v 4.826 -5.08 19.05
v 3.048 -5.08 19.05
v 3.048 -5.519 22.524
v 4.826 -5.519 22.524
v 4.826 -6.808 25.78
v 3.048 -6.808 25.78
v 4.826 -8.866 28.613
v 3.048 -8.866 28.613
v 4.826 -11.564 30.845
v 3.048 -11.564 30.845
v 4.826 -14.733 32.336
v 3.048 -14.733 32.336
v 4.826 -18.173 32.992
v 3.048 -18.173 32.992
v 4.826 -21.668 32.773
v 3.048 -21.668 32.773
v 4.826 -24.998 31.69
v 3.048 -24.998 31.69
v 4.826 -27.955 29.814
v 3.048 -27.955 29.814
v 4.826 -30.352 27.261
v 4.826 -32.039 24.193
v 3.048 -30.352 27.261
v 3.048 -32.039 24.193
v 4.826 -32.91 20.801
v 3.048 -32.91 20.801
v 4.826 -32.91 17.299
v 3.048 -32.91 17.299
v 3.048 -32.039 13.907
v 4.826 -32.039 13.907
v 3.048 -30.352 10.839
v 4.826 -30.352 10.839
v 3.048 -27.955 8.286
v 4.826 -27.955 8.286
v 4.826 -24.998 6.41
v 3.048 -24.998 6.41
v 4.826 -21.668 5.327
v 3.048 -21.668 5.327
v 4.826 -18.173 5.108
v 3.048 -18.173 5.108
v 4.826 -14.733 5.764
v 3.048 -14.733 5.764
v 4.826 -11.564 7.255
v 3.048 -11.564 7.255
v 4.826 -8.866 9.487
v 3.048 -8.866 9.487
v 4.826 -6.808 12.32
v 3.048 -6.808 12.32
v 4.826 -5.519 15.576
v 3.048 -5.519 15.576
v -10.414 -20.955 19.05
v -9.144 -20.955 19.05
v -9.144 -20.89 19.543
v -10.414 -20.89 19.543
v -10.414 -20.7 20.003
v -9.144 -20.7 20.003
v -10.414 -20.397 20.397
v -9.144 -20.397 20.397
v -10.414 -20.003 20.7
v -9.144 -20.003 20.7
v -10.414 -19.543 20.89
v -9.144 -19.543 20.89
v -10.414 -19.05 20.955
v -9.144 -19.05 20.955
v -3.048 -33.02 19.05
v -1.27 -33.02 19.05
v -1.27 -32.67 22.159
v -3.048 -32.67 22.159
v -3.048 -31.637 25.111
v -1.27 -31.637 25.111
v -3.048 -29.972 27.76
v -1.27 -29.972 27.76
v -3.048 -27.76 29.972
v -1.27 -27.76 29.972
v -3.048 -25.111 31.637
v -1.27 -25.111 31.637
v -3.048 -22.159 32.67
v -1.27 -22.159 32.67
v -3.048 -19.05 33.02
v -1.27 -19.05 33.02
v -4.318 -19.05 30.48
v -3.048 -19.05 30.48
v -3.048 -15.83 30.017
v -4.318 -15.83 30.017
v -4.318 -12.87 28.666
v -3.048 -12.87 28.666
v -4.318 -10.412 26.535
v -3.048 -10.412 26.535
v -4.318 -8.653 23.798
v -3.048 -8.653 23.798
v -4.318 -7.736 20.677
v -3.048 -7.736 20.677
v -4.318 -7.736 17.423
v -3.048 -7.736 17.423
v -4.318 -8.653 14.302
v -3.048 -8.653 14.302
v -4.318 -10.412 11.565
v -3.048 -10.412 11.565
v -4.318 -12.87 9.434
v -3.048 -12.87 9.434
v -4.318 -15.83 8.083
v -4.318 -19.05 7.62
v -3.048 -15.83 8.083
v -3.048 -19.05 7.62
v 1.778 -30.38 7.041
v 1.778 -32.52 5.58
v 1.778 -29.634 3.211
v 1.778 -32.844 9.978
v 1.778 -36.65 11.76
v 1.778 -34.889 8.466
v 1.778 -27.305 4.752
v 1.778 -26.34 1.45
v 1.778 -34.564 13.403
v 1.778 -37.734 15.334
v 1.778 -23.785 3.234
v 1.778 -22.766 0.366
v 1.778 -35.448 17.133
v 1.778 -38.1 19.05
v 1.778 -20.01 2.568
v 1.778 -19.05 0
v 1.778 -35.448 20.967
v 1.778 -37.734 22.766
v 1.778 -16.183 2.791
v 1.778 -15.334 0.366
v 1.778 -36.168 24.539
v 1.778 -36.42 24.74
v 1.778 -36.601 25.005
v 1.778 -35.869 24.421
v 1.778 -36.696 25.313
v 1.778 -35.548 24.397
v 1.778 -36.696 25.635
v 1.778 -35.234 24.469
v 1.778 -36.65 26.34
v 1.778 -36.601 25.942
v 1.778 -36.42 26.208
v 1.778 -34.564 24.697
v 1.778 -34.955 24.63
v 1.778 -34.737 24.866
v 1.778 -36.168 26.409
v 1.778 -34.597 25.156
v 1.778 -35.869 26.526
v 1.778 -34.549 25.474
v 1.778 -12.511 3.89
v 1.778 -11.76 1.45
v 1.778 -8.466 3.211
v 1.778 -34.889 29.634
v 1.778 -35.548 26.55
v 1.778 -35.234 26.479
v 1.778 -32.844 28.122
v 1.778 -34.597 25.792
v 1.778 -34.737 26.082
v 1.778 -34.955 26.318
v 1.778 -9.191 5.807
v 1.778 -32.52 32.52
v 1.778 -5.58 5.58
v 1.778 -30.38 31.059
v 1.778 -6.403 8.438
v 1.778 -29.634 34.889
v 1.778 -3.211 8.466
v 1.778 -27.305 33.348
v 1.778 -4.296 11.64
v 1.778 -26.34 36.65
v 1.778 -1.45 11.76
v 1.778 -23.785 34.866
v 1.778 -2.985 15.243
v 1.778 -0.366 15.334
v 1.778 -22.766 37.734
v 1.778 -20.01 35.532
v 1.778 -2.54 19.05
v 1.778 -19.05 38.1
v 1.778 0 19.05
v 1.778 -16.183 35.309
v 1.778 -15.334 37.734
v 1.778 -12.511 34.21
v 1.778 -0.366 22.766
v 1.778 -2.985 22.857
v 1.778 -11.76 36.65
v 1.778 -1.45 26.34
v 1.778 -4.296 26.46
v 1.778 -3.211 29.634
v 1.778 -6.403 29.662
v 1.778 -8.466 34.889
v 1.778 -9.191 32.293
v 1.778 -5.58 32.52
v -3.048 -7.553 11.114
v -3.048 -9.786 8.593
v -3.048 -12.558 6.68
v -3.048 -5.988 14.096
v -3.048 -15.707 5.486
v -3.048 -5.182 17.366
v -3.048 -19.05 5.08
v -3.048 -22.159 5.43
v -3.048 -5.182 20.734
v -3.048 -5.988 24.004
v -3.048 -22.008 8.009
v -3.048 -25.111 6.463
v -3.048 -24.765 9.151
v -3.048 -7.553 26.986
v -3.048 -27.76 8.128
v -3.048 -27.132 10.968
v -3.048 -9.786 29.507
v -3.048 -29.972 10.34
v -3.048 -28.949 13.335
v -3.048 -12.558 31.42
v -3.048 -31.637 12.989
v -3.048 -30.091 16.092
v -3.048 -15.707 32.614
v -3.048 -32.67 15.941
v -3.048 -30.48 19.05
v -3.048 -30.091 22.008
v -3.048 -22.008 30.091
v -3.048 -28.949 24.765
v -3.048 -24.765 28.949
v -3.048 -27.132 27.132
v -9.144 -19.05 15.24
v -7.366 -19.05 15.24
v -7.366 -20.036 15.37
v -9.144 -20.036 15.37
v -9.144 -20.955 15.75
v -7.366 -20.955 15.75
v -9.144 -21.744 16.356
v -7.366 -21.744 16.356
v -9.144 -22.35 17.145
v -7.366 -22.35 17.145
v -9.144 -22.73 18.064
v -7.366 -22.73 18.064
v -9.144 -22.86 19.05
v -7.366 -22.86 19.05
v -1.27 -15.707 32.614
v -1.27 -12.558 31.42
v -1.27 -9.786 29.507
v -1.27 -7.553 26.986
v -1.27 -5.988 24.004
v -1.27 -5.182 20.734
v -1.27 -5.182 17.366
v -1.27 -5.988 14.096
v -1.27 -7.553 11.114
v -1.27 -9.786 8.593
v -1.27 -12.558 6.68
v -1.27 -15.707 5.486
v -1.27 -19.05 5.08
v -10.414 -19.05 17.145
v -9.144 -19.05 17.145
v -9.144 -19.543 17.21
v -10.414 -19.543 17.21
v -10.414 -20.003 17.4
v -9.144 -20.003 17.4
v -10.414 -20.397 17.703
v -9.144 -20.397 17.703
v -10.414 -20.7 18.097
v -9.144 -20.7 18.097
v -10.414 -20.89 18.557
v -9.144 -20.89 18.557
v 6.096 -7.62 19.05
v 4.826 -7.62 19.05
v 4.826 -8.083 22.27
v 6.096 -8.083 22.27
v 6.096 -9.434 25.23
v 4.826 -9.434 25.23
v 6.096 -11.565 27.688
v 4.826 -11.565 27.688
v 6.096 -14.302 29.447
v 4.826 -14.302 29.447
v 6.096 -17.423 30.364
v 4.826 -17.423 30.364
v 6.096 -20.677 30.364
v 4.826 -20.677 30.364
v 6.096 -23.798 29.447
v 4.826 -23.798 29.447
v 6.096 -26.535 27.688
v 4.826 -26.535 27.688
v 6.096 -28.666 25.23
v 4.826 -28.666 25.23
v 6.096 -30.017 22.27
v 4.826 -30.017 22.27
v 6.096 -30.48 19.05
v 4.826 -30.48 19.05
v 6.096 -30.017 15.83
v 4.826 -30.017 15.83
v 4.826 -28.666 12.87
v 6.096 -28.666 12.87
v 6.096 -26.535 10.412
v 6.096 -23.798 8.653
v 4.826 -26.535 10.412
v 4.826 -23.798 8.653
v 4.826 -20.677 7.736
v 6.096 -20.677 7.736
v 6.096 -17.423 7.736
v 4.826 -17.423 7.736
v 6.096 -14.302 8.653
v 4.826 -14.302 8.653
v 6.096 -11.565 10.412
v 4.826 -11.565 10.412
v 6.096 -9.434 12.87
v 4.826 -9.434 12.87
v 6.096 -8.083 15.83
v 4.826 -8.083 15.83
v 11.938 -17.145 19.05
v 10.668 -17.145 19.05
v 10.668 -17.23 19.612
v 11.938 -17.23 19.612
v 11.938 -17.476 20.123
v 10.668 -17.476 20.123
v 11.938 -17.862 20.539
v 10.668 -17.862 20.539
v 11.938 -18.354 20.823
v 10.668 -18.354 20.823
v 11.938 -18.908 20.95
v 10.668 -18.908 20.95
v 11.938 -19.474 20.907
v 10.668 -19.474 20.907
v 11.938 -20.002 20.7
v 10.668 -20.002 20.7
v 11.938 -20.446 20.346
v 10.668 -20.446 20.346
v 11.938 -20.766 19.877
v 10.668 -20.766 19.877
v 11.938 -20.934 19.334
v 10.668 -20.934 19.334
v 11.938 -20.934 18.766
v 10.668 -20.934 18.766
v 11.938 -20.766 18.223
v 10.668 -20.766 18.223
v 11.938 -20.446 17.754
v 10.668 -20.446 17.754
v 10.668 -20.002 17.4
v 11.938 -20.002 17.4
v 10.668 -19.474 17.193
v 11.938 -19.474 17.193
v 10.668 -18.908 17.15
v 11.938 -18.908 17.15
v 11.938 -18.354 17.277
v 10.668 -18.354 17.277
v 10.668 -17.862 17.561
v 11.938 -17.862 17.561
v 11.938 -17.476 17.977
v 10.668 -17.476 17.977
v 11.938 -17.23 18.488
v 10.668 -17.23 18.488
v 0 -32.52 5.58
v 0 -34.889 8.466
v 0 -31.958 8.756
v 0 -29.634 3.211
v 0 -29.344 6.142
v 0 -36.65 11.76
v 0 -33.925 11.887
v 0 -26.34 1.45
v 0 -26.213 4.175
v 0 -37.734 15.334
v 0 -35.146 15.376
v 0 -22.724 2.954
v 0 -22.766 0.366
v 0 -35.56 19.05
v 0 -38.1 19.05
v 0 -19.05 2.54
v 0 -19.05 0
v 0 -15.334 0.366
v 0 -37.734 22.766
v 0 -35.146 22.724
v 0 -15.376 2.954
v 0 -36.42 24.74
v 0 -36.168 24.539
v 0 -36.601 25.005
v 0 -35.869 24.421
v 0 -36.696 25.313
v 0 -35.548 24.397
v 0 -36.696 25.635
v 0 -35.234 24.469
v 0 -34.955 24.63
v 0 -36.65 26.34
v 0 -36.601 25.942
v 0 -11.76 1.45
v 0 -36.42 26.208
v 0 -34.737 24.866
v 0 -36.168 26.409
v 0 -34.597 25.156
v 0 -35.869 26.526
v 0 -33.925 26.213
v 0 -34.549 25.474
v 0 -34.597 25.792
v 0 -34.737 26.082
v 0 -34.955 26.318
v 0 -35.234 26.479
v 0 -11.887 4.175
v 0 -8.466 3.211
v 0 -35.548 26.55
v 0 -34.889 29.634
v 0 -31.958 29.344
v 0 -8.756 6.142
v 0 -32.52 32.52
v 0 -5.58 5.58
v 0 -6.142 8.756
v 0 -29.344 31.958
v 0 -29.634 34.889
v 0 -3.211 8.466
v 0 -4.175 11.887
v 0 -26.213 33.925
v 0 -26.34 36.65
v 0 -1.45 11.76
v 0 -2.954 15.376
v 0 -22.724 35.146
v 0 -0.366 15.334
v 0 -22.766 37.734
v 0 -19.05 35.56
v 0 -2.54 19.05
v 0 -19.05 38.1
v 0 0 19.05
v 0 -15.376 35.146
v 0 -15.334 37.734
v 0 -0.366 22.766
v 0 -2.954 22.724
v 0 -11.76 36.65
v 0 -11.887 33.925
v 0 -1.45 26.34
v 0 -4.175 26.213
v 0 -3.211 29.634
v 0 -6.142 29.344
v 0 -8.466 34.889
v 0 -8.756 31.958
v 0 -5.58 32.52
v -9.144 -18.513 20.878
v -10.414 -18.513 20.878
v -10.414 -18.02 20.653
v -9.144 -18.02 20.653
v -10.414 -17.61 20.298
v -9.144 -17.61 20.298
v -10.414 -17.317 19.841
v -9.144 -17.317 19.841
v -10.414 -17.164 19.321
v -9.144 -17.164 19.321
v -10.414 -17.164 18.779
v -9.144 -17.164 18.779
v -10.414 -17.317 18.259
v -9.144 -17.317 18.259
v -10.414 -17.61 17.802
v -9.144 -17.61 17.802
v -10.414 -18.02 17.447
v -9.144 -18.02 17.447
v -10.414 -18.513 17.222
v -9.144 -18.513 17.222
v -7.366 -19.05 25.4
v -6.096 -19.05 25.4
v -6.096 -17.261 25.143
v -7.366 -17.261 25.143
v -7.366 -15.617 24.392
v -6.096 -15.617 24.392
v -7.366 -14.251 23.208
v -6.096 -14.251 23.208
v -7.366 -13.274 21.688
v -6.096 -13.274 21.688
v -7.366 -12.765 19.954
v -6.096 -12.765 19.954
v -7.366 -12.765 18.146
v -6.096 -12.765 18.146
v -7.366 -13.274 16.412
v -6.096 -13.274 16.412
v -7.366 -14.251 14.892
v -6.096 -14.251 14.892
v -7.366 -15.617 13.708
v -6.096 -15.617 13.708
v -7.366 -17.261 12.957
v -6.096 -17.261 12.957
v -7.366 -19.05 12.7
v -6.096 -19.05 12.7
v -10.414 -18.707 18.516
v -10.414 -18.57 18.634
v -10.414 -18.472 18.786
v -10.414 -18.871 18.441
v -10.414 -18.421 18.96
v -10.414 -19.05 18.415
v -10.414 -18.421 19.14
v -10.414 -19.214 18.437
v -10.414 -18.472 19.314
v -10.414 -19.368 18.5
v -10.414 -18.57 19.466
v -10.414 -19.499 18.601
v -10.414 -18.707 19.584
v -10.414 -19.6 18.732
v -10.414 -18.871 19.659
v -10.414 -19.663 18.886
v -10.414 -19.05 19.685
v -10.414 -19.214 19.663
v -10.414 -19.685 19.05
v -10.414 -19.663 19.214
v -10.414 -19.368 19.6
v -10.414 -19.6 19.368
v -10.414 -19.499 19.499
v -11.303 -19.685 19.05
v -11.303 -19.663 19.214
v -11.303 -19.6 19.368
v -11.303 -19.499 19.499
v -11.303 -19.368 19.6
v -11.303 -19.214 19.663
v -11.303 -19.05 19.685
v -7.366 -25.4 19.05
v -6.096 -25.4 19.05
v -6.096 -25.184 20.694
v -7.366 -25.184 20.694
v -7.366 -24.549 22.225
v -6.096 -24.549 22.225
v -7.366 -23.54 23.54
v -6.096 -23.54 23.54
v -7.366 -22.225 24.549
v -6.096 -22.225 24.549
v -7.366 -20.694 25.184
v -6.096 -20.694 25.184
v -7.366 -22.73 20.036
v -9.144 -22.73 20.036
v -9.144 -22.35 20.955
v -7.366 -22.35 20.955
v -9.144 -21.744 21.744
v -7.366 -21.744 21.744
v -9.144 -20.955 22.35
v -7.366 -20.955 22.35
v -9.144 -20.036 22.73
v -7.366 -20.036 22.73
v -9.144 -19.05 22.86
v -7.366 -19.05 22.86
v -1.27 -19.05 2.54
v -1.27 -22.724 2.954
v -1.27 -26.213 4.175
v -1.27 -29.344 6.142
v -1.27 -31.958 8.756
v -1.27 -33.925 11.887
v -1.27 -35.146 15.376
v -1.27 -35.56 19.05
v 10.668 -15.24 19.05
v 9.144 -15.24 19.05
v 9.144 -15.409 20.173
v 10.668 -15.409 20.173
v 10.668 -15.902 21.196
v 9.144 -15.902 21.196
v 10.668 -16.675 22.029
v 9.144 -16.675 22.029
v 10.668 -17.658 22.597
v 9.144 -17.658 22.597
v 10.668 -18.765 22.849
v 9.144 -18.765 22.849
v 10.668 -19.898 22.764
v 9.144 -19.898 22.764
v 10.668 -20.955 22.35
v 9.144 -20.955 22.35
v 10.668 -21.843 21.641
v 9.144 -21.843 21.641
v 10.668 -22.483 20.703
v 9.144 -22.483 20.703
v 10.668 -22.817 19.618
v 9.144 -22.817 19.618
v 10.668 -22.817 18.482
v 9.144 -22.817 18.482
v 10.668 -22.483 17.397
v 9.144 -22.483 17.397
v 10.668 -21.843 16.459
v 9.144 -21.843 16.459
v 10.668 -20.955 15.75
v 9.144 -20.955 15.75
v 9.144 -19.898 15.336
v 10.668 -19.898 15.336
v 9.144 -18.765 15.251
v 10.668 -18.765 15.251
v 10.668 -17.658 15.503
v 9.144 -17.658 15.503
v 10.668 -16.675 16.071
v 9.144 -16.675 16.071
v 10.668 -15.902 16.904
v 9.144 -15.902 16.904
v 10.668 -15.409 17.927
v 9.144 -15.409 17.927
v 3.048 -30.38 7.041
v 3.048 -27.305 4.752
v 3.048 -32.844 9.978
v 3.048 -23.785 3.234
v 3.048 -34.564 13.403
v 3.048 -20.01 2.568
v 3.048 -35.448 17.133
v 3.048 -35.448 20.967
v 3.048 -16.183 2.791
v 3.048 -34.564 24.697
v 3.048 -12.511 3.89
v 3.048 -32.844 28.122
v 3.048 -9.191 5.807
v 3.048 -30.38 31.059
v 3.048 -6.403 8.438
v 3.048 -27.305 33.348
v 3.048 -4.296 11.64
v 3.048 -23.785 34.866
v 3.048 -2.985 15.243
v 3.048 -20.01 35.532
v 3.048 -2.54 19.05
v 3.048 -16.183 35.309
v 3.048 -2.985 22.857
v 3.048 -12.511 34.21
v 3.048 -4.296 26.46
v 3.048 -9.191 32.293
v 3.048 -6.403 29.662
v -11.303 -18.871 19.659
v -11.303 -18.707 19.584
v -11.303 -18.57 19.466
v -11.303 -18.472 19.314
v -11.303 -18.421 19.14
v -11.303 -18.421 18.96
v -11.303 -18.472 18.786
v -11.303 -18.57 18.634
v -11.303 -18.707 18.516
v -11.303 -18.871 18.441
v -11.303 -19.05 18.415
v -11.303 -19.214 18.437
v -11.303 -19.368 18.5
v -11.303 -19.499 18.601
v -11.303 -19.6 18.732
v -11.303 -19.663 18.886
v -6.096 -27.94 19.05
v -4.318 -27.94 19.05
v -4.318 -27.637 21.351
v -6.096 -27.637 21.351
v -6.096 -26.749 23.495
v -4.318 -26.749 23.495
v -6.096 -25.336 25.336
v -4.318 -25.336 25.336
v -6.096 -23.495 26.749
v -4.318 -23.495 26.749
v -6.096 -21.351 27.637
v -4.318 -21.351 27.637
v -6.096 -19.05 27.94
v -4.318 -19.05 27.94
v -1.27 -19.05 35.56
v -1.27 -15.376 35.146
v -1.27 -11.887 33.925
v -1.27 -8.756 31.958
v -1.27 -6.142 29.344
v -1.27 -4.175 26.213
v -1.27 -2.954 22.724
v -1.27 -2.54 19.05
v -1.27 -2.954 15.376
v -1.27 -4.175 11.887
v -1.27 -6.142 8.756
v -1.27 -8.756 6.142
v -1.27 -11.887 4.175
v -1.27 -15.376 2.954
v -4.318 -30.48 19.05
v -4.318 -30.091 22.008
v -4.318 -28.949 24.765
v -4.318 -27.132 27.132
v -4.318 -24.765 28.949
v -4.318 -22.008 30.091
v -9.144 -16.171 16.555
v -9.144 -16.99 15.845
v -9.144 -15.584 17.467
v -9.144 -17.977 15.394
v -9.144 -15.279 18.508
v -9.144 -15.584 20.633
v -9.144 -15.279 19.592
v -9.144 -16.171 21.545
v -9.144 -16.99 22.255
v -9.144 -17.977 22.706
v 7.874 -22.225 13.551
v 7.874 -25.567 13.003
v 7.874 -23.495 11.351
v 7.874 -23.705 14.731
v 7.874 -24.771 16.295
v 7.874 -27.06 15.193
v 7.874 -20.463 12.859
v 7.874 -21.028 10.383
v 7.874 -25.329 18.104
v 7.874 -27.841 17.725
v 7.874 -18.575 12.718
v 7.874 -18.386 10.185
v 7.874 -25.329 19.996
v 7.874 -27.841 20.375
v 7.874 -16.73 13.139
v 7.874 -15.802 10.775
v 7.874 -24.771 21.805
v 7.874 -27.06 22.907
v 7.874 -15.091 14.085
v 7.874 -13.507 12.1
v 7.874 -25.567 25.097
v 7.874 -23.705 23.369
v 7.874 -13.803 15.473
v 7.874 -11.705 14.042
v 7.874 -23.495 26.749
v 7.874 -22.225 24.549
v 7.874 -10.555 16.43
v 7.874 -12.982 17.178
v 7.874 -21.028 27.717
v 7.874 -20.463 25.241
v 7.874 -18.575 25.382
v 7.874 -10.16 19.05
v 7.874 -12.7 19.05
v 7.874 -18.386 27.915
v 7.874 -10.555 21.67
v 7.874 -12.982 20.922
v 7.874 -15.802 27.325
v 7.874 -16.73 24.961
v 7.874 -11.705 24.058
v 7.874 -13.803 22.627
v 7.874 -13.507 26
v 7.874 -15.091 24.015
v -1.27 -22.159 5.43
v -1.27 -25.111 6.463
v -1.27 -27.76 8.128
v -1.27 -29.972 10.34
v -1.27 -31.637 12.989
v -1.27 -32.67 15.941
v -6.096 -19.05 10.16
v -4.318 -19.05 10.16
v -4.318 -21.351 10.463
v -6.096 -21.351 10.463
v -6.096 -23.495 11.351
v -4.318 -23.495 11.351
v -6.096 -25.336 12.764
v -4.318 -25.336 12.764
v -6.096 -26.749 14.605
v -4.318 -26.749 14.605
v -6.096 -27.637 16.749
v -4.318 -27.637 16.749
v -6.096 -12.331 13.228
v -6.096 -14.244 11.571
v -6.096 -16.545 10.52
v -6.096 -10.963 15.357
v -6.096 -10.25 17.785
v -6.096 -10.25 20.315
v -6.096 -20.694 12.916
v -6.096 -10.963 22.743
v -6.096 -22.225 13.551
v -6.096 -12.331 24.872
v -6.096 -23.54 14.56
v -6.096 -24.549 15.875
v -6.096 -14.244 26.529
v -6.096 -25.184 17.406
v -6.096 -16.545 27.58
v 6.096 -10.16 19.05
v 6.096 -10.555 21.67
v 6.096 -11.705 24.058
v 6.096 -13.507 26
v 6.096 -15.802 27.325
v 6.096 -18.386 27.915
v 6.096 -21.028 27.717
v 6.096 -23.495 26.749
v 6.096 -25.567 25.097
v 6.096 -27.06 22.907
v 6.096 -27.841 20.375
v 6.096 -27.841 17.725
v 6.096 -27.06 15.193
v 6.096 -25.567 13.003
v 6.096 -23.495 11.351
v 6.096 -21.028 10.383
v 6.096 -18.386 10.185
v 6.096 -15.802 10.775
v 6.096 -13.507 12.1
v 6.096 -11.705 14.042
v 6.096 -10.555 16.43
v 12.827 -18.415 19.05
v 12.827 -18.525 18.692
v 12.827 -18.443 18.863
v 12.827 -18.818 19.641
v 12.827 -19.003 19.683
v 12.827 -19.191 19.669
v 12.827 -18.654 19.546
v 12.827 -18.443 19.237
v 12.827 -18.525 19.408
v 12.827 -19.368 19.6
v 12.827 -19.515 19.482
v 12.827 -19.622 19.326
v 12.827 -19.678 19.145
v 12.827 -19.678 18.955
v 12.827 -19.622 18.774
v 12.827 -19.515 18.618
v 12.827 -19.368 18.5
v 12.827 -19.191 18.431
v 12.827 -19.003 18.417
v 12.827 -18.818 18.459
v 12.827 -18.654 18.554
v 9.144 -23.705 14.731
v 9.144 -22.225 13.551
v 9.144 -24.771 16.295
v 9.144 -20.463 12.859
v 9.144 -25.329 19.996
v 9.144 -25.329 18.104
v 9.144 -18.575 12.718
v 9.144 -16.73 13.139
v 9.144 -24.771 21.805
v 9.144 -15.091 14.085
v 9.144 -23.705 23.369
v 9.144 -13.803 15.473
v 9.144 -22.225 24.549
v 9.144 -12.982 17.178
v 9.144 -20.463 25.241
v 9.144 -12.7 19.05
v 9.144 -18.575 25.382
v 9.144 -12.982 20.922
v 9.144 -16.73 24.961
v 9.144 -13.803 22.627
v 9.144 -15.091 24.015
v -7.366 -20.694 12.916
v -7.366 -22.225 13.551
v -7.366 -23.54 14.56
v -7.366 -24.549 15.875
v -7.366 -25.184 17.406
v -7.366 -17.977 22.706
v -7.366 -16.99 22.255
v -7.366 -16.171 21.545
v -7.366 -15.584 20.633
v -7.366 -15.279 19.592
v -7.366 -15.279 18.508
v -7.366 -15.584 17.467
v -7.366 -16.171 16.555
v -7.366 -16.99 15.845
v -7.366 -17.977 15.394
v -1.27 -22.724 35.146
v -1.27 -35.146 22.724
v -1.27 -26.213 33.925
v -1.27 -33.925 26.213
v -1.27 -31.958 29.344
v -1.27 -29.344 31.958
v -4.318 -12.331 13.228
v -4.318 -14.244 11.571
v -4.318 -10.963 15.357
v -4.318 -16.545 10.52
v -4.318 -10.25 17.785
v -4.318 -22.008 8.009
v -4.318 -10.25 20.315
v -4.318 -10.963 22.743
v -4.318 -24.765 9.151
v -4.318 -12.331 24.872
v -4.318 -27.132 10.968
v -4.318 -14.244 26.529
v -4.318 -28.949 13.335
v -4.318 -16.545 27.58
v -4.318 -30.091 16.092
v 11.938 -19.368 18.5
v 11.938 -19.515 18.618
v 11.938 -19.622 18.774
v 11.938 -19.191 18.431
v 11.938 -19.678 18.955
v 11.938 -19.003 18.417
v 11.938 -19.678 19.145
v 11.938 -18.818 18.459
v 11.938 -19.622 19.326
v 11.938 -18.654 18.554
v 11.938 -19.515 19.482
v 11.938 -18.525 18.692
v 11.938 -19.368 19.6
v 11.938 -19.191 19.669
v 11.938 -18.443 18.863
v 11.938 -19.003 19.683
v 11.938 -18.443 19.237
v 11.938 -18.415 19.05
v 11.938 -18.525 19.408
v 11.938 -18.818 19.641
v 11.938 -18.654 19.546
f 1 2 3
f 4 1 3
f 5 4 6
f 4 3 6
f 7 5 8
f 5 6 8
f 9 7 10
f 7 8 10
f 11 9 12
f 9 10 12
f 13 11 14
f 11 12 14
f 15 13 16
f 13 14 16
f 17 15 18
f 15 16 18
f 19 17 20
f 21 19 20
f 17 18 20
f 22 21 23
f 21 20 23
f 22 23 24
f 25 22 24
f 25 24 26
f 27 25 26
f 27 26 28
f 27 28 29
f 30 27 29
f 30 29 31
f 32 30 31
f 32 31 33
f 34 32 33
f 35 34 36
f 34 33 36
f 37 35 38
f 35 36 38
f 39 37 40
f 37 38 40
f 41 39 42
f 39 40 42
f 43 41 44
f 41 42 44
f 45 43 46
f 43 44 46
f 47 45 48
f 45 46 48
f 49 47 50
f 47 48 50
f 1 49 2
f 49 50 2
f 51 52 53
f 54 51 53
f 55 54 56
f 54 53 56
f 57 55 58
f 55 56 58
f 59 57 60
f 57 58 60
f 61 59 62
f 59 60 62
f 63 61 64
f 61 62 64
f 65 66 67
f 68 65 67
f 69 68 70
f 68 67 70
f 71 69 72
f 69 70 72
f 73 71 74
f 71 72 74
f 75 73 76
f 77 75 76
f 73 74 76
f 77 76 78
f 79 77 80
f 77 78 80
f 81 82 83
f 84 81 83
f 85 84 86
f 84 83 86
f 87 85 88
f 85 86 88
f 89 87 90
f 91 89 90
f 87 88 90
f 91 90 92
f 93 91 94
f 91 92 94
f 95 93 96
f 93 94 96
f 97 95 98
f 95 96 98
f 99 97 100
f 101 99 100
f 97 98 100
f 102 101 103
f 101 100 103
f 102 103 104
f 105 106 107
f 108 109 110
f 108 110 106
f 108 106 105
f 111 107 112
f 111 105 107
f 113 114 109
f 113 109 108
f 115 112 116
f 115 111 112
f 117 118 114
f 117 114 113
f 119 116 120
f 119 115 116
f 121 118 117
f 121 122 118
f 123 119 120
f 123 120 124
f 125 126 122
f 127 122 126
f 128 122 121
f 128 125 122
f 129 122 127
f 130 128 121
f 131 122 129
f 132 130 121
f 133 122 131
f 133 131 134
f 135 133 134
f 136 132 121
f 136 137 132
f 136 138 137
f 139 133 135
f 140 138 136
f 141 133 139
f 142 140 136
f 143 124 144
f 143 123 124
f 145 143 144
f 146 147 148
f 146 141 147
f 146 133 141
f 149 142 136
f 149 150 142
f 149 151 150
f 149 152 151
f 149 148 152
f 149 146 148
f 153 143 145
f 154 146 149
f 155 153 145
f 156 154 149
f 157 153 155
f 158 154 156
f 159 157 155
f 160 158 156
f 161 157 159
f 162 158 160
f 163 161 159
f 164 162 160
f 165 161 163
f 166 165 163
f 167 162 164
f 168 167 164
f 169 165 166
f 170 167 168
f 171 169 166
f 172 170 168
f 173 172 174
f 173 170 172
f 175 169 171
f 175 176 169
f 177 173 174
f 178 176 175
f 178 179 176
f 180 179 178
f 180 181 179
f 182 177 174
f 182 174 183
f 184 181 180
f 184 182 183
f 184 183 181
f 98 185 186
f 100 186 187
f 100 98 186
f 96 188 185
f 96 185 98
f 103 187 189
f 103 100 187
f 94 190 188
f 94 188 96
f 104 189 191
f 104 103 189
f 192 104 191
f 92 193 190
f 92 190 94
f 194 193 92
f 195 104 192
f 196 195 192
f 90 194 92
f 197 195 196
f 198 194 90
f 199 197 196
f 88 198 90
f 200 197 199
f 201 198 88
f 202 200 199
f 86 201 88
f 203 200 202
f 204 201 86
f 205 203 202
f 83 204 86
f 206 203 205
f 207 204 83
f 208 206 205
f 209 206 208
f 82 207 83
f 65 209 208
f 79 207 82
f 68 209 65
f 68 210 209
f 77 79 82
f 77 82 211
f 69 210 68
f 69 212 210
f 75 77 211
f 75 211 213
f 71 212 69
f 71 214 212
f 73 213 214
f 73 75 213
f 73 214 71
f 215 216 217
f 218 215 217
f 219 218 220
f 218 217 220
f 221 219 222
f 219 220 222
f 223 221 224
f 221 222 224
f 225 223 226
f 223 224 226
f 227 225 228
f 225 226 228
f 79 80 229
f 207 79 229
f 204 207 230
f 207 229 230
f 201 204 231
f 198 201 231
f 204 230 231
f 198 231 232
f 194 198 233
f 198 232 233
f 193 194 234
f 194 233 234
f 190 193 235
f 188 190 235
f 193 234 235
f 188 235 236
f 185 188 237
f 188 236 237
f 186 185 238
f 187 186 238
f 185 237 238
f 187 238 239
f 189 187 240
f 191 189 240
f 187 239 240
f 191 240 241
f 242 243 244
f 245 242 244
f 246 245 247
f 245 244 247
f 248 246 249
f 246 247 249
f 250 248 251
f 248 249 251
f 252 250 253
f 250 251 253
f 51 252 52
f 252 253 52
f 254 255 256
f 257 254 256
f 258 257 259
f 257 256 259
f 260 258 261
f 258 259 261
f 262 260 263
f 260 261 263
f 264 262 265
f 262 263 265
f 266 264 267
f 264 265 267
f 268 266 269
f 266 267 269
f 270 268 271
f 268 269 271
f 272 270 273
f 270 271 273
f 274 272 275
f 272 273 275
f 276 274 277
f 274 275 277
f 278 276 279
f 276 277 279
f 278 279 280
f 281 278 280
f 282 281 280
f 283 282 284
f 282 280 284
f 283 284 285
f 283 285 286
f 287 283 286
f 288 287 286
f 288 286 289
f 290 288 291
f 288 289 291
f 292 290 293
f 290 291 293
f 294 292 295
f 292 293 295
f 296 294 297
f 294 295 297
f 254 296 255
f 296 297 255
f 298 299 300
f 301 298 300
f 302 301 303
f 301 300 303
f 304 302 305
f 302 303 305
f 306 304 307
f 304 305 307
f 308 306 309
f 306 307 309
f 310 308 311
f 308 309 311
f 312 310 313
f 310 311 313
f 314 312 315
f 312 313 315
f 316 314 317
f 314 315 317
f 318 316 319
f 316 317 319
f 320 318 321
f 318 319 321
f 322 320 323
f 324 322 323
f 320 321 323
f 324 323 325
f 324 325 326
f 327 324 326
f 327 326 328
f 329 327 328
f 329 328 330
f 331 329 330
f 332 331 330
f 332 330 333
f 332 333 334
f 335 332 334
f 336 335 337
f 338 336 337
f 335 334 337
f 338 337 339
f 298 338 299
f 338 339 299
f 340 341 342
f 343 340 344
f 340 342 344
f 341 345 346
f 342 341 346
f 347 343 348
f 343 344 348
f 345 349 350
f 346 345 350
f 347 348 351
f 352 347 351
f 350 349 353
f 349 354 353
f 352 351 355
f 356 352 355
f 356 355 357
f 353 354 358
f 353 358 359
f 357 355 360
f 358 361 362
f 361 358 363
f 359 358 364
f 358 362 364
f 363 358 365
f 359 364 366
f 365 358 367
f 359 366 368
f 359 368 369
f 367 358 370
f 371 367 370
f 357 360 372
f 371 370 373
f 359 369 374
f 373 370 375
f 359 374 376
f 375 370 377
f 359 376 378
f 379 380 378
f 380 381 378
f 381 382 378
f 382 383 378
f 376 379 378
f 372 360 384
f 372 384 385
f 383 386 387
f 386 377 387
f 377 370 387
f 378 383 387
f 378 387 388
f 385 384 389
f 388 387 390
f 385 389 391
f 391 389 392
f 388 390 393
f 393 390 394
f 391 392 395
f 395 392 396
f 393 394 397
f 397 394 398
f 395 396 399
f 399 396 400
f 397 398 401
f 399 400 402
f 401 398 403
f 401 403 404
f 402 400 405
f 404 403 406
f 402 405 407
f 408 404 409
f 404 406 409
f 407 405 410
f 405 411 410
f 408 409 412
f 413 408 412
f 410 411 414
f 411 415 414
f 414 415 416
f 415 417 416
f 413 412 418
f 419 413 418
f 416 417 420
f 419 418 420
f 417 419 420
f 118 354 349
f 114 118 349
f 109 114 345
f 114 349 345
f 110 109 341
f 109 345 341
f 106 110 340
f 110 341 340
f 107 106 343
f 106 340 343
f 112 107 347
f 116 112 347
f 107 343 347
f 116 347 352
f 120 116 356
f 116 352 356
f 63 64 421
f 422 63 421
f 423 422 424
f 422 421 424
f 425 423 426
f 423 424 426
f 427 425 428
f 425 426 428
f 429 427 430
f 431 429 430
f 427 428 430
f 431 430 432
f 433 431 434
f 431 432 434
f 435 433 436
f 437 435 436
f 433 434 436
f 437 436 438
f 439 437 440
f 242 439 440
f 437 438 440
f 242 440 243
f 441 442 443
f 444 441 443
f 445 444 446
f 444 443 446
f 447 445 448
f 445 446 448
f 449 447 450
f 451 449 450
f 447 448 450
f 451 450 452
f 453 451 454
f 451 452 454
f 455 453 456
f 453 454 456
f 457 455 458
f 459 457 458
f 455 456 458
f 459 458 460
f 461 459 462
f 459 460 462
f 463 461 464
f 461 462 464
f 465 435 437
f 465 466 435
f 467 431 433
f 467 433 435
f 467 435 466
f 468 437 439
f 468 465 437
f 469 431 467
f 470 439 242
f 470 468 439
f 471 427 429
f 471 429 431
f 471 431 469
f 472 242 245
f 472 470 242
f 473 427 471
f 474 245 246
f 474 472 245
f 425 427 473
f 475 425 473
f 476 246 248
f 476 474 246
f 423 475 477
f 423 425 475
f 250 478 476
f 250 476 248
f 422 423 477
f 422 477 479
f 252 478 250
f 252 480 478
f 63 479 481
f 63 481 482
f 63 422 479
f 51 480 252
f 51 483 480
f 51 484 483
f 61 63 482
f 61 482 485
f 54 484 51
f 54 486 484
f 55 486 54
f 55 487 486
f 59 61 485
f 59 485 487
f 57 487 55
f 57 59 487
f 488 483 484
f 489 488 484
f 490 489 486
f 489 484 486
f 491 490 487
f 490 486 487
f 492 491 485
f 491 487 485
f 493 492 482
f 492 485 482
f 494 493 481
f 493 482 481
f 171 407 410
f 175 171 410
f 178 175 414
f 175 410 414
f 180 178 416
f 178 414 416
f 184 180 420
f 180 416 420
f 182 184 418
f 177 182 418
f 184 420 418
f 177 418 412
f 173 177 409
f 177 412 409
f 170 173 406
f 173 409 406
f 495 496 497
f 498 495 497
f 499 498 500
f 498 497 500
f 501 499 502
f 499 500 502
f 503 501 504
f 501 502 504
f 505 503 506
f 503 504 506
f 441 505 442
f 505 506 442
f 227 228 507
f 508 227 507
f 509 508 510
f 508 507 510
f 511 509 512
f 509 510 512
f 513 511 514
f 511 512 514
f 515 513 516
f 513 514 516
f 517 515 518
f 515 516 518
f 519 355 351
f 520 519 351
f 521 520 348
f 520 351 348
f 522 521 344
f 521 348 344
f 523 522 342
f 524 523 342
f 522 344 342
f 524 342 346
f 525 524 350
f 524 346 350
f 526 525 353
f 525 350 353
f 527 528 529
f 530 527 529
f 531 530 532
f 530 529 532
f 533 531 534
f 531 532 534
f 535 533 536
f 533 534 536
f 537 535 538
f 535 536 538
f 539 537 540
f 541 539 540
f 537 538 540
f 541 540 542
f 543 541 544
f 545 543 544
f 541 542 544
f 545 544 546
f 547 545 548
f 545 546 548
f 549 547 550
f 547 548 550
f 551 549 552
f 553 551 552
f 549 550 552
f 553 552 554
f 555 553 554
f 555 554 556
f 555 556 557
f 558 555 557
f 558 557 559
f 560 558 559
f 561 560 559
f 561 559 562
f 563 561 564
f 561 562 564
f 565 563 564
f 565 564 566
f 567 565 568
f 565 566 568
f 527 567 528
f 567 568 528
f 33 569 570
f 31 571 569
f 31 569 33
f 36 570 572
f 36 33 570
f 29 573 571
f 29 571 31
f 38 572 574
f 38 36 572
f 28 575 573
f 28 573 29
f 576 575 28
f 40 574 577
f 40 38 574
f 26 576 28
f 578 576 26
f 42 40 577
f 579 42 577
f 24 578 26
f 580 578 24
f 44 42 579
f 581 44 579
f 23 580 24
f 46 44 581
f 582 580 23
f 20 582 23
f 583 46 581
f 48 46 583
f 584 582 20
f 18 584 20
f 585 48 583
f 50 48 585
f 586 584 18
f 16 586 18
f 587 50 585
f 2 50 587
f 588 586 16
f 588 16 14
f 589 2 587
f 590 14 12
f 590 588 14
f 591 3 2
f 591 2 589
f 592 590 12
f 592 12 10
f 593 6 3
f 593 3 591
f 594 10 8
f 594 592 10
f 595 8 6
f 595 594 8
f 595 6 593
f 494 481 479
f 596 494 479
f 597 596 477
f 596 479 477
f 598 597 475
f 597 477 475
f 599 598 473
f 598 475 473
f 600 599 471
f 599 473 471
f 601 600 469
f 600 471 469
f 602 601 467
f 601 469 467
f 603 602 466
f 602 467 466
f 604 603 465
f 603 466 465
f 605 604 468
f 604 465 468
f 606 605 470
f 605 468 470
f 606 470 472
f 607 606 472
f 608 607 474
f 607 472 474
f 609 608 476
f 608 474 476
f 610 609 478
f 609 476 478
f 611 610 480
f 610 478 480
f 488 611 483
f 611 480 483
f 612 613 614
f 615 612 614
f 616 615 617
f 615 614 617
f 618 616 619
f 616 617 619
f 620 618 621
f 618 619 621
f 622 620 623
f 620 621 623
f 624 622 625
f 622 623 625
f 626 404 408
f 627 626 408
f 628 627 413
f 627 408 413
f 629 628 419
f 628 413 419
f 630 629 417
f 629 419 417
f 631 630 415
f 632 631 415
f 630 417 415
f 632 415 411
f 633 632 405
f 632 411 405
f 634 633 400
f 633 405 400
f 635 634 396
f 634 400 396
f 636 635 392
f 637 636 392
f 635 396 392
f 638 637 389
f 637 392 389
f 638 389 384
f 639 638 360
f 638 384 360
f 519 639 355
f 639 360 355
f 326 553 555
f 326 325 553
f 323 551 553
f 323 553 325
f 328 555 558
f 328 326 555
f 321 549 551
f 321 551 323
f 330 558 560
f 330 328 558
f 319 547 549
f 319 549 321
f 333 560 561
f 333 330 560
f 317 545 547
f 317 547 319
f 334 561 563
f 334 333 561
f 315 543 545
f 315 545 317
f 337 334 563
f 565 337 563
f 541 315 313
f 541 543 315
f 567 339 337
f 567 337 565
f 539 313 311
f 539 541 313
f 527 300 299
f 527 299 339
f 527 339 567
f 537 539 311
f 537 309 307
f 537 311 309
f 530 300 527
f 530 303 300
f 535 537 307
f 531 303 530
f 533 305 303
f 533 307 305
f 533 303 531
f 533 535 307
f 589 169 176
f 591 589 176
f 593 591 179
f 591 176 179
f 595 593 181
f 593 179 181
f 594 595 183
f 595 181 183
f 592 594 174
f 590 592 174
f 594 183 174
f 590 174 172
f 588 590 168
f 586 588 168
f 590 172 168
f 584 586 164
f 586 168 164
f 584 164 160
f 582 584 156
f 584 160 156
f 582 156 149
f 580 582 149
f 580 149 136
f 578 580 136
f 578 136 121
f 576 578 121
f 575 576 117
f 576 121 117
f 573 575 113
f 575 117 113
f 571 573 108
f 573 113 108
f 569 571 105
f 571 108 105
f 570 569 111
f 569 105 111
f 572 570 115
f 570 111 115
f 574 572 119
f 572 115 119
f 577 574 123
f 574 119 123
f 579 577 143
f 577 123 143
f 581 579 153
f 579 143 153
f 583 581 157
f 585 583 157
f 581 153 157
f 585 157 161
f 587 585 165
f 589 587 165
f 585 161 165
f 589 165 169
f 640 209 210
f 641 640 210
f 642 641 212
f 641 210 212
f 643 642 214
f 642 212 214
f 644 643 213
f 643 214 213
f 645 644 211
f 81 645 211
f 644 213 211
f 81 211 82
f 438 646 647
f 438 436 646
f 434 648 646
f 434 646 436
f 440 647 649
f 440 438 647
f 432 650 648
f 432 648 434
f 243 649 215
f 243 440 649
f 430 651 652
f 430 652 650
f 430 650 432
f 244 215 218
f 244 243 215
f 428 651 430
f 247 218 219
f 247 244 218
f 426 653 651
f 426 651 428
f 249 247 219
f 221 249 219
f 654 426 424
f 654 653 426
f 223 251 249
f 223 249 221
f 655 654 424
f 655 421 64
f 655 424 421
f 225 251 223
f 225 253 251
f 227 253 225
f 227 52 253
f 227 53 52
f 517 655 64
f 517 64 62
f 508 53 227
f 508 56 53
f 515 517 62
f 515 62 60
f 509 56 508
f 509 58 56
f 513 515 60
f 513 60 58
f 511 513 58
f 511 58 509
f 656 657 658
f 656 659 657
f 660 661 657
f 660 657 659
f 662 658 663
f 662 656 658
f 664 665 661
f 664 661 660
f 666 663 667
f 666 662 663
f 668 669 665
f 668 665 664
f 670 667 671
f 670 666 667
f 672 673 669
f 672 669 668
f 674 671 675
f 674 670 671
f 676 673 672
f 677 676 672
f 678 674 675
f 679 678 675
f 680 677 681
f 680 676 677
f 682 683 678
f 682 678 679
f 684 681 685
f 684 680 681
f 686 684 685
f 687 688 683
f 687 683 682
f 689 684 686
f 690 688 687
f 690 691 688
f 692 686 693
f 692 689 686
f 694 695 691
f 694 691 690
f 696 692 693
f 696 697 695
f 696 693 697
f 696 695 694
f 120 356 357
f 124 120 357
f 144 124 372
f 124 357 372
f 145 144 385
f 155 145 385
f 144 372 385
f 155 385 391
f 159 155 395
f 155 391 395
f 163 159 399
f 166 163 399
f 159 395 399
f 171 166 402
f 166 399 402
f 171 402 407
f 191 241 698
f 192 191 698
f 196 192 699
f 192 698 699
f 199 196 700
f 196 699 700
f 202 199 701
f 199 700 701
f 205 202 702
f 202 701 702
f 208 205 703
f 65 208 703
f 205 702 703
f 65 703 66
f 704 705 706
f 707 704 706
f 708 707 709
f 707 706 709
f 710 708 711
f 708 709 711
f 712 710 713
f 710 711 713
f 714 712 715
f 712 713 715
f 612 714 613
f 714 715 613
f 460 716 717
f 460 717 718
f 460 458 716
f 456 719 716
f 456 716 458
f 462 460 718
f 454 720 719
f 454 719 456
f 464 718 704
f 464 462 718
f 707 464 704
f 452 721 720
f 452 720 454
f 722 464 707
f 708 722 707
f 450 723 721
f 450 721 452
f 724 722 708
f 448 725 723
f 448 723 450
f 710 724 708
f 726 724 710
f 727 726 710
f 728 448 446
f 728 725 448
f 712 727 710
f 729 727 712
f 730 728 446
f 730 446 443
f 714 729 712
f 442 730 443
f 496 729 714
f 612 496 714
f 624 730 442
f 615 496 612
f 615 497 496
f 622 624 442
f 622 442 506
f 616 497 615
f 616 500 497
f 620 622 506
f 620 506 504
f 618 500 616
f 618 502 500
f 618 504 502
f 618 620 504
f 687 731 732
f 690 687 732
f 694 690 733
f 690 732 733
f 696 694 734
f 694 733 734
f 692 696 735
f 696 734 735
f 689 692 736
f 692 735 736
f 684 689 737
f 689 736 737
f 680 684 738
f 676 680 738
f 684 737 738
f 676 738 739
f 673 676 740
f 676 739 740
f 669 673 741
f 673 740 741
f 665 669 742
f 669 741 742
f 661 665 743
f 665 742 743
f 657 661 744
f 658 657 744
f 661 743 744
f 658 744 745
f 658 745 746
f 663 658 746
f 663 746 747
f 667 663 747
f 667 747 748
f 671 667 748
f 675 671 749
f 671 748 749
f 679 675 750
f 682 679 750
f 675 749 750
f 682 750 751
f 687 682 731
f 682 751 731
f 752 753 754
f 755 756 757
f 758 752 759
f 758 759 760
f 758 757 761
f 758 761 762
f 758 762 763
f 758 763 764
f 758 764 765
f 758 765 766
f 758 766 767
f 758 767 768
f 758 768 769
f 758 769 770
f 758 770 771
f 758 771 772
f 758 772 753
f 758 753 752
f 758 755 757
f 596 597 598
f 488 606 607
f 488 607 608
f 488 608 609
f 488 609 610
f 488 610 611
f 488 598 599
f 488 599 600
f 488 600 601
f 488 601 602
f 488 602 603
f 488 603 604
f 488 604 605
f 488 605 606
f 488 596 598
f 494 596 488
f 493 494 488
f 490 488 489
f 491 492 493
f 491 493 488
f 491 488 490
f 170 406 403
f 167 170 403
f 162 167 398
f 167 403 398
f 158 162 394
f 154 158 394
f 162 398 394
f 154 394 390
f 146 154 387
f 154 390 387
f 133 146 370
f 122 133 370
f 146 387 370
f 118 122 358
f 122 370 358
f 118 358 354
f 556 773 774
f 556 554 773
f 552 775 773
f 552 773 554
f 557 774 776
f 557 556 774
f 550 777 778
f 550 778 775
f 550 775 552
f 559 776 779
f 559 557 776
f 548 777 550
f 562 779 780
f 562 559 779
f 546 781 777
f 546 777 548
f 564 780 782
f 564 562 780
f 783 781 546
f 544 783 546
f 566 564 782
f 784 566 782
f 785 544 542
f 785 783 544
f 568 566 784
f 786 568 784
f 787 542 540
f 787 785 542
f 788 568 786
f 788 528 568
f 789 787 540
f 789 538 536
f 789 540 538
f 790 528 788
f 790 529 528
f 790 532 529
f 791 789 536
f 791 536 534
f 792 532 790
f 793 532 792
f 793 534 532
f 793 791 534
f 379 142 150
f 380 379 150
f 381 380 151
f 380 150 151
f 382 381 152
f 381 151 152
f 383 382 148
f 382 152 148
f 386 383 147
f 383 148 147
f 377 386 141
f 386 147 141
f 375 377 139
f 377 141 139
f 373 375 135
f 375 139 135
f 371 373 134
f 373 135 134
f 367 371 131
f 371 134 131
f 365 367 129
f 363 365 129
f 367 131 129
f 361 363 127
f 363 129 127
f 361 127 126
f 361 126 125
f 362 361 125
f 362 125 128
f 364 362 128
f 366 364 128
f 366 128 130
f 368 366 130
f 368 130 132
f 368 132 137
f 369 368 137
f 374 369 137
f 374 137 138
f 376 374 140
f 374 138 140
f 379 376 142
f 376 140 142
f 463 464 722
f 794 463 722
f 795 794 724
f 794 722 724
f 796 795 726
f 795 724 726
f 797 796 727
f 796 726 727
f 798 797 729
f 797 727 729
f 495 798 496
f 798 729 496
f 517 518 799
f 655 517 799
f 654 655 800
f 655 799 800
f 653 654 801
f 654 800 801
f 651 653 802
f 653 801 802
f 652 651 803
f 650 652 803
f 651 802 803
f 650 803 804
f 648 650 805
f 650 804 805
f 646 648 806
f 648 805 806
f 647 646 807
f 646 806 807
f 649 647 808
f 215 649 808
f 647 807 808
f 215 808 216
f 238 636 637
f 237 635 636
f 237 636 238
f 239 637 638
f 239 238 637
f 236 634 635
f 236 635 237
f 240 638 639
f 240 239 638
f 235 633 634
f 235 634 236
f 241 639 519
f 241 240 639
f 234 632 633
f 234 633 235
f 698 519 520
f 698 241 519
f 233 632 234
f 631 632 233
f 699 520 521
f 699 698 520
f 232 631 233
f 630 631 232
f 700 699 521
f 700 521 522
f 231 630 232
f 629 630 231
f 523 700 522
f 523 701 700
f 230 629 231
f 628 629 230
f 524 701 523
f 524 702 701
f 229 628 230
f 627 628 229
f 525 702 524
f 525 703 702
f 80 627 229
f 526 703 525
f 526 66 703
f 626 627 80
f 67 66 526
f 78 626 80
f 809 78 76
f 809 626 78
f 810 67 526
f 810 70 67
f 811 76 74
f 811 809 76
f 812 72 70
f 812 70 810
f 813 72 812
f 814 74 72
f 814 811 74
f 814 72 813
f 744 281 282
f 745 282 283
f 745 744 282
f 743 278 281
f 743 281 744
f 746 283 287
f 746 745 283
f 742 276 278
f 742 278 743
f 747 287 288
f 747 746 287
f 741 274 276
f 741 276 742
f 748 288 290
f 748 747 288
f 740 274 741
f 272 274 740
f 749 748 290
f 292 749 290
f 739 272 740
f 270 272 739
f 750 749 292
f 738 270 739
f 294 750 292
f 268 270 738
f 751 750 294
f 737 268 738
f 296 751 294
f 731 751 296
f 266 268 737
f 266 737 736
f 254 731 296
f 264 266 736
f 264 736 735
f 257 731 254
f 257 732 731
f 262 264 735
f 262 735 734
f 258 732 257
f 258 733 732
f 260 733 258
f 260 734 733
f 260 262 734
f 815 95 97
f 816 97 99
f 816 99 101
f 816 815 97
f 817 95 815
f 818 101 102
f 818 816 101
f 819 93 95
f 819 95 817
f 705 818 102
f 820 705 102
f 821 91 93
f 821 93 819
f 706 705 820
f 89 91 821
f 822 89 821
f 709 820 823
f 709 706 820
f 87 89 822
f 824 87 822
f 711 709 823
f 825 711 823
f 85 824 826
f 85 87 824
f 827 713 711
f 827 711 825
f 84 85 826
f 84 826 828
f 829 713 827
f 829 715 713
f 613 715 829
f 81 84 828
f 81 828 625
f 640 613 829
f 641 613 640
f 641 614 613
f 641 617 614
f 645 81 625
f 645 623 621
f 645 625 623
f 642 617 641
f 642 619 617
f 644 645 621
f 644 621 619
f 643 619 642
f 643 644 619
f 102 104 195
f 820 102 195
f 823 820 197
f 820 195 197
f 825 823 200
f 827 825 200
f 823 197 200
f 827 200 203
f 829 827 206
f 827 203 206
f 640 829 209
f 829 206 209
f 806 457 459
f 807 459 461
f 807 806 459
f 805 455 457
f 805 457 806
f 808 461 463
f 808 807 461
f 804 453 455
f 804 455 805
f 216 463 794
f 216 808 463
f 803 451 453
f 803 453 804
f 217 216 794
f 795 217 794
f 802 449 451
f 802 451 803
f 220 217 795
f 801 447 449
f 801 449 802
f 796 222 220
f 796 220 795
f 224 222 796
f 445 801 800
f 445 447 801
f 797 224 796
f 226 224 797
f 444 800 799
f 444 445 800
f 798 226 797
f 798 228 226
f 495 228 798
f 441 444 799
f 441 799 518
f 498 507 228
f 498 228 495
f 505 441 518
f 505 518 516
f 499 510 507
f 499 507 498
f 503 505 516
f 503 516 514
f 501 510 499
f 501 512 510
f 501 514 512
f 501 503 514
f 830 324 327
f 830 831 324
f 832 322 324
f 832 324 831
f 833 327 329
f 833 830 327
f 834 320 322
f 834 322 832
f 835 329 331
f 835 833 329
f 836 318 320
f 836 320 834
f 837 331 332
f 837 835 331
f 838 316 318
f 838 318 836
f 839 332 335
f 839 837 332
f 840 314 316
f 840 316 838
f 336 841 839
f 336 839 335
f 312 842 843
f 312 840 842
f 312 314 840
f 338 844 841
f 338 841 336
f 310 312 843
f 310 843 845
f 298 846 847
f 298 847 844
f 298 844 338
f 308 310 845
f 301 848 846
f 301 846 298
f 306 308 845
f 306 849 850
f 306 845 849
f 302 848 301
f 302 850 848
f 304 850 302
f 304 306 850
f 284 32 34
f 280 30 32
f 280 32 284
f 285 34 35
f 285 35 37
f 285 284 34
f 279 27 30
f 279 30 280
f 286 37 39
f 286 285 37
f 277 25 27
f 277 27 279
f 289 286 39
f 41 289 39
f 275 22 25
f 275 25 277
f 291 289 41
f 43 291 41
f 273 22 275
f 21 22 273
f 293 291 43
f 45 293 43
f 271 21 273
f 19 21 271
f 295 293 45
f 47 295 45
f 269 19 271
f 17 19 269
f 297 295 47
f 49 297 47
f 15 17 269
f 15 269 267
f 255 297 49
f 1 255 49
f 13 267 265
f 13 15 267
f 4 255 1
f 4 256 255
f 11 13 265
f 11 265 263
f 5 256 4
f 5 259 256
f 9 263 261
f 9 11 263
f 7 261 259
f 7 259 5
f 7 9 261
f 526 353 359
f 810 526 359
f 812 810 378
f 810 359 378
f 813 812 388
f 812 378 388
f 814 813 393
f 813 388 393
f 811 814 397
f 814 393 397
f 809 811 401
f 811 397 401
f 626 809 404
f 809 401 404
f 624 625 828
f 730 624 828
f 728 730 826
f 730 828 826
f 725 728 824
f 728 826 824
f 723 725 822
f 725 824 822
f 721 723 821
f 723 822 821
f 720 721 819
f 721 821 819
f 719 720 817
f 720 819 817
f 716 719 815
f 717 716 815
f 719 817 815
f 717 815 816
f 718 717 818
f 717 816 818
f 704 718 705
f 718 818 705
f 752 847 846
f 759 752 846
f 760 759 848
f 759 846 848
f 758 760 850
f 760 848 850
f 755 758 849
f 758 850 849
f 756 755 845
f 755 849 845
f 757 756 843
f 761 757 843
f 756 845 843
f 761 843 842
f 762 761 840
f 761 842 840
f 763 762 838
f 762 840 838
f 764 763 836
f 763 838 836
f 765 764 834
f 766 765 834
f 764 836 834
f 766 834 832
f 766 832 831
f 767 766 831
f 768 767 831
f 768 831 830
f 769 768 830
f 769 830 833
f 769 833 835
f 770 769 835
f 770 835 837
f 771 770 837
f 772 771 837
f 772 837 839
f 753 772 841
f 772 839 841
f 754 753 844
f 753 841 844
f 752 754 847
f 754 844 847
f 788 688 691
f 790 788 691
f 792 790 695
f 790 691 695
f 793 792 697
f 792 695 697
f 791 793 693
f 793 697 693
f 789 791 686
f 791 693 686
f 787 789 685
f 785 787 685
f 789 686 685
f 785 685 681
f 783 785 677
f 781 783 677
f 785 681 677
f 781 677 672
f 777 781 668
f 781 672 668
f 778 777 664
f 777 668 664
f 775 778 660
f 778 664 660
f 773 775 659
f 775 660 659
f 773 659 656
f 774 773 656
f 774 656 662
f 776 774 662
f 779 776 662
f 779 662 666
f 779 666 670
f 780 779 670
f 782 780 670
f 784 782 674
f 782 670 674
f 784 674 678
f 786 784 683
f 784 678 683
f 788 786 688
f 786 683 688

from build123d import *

# Parameters (mm, degrees)
F1_DEPTH  = 1.778
F2_R      = 16.51
F3_DEPTH  = 1.27
F4_R      = 13.97
F5_DEPTH  = 1.778
F6_R      = 11.43
F7_DEPTH  = 1.27
F8_R      = 8.89
F9_DEPTH  = 1.778
F10_R     = 6.35
F11_DEPTH = 1.27
F12_R     = 3.81
F13_DEPTH = 1.524
F14_R     = 1.905
F15_DEPTH = 1.27
F16_R     = 0.635
F17_DEPTH = 0.889
F18_R     = 1.0795
F19_DEPTH = 1.778
F21_DEPTH = 1.27
F23_DEPTH = 1.778
F25_DEPTH = 1.27
F27_DEPTH = 1.778
F29_DEPTH = 1.27
F31_DEPTH = 1.778
F33_DEPTH = 1.27
F35_DEPTH = 0.889


with BuildPart() as f1:
    # F0 (on Right) → F1 (new body)
    with BuildSketch(Plane.YZ):
        with BuildLine():
            ThreePointArc((-19.05, 0), (-5.5796158184, 5.5796158184), (0, 19.05))
            ThreePointArc((0, 19.05), (-5.5796158184, 32.5203841816), (-19.05, 38.1))
            ThreePointArc((-19.05, 38.1), (-32.5203841816, 32.5203841816), (-38.1, 19.05))
            ThreePointArc((-38.1, 19.05), (-32.5203841816, 5.5796158184), (-19.05, 0))
        make_face()
    extrude(amount=F1_DEPTH)

    # F2 (on face) → F3 (join)
    with BuildSketch(Plane.YZ.offset(1.778)):
        with Locations((-19.05, 19.05)):
            Circle(F2_R)
    extrude(amount=F3_DEPTH)

    # F4 (on face) → F5 (join)
    with BuildSketch(Plane.YZ.offset(3.048)):
        with Locations((-19.05, 19.05)):
            Circle(F4_R)
    extrude(amount=F5_DEPTH)

    # F6 (on face) → F7 (join)
    with BuildSketch(Plane.YZ.offset(4.826)):
        with Locations((-19.05, 19.05)):
            Circle(F6_R)
    extrude(amount=F7_DEPTH)

    # F8 (on face) → F9 (join)
    with BuildSketch(Plane.YZ.offset(6.096)):
        with Locations((-19.05, 19.05)):
            Circle(F8_R)
    extrude(amount=F9_DEPTH)

    # F10 (on face) → F11 (join)
    with BuildSketch(Plane.YZ.offset(7.874)):
        with Locations((-19.05, 19.05)):
            Circle(F10_R)
    extrude(amount=F11_DEPTH)

    # F12 (on face) → F13 (join)
    with BuildSketch(Plane.YZ.offset(9.144)):
        with Locations((-19.05, 19.05)):
            Circle(F12_R)
    extrude(amount=F13_DEPTH)

    # F14 (on face) → F15 (join)
    with BuildSketch(Plane.YZ.offset(10.668)):
        with Locations((-19.05, 19.05)):
            Circle(F14_R)
    extrude(amount=F15_DEPTH)

    # F16 (on face) → F17 (join)
    with BuildSketch(Plane.YZ.offset(11.938)):
        with Locations((-19.05, 19.05)):
            Circle(F16_R)
    extrude(amount=F17_DEPTH)

    # F18 (on face) → F19 (cut)
    with BuildSketch(Plane.YZ.offset(1.778)):
        with Locations((-35.6285501971, 25.4737715009)):
            Circle(F18_R)
    extrude(amount=-F19_DEPTH, mode=Mode.SUBTRACT)

    # F20 (on face) → F21 (join)
    with BuildSketch(Plane(origin=(0, 0, 0), x_dir=(0, -1, 0), z_dir=(-1, 0, 0))):
        with BuildLine():
            ThreePointArc((19.05, 35.56), (2.54, 19.05), (19.05, 2.54))
            Line((19.05, 2.54), (19.05, 35.56))
        make_face()
        with BuildLine():
            Line((19.05, 35.56), (19.05, 2.54))
            ThreePointArc((19.05, 2.54), (30.7243329574, 7.3756670426), (35.56, 19.05))
            ThreePointArc((35.56, 19.05), (30.7243329574, 30.7243329574), (19.05, 35.56))
        make_face()
    extrude(amount=F21_DEPTH)

    # F22 (on face) → F23 (join)
    with BuildSketch(Plane(origin=(-1.27, 0, 0), x_dir=(0, -1, 0), z_dir=(-1, 0, 0))):
        with BuildLine():
            ThreePointArc((19.05, 33.02), (5.08, 19.05), (19.05, 5.08))
            Line((19.05, 5.08), (19.05, 33.02))
        make_face()
        with BuildLine():
            Line((19.05, 33.02), (19.05, 5.08))
            ThreePointArc((19.05, 5.08), (28.9282817332, 9.1717182668), (33.02, 19.05))
            ThreePointArc((33.02, 19.05), (28.9282817332, 28.9282817332), (19.05, 33.02))
        make_face()
    extrude(amount=F23_DEPTH)

    # F24 (on face) → F25 (join)
    with BuildSketch(Plane(origin=(-3.048, 0, 0), x_dir=(0, -1, 0), z_dir=(-1, 0, 0))):
        with BuildLine():
            Line((19.05, 30.48), (19.05, 7.62))
            ThreePointArc((19.05, 7.62), (27.132230509, 10.967769491), (30.48, 19.05))
            ThreePointArc((30.48, 19.05), (27.132230509, 27.132230509), (19.05, 30.48))
        make_face()
        with BuildLine():
            ThreePointArc((19.05, 30.48), (7.62, 19.05), (19.05, 7.62))
            Line((19.05, 7.62), (19.05, 30.48))
        make_face()
    extrude(amount=F25_DEPTH)

    # F26 (on face) → F27 (join)
    with BuildSketch(Plane(origin=(-4.318, 0, 0), x_dir=(0, -1, 0), z_dir=(-1, 0, 0))):
        with BuildLine():
            ThreePointArc((19.05, 27.94), (10.16, 19.05), (19.05, 10.16))
            Line((19.05, 10.16), (19.05, 27.94))
        make_face()
        with BuildLine():
            Line((19.05, 27.94), (19.05, 10.16))
            ThreePointArc((19.05, 10.16), (25.3361792847, 12.7638207153), (27.94, 19.05))
            ThreePointArc((27.94, 19.05), (25.3361792847, 25.3361792847), (19.05, 27.94))
        make_face()
    extrude(amount=F27_DEPTH)

    # F28 (on face) → F29 (join)
    with BuildSketch(Plane(origin=(-6.096, 0, 0), x_dir=(0, -1, 0), z_dir=(-1, 0, 0))):
        with BuildLine():
            ThreePointArc((19.05, 25.4), (12.7, 19.05), (19.05, 12.7))
            Line((19.05, 12.7), (19.05, 25.4))
        make_face()
        with BuildLine():
            Line((19.05, 25.4), (19.05, 12.7))
            ThreePointArc((19.05, 12.7), (23.5401280605, 14.5598719395), (25.4, 19.05))
            ThreePointArc((25.4, 19.05), (23.5401280605, 23.5401280605), (19.05, 25.4))
        make_face()
    extrude(amount=F29_DEPTH)

    # F30 (on face) → F31 (join)
    with BuildSketch(Plane(origin=(-7.366, 0, 0), x_dir=(0, -1, 0), z_dir=(-1, 0, 0))):
        with BuildLine():
            ThreePointArc((19.05, 22.86), (15.24, 19.05), (19.05, 15.24))
            Line((19.05, 15.24), (19.05, 22.86))
        make_face()
        with BuildLine():
            Line((19.05, 22.86), (19.05, 15.24))
            ThreePointArc((19.05, 15.24), (21.7440768363, 16.3559231637), (22.86, 19.05))
            ThreePointArc((22.86, 19.05), (21.7440768363, 21.7440768363), (19.05, 22.86))
        make_face()
    extrude(amount=F31_DEPTH)

    # F32 (on face) → F33 (join)
    with BuildSketch(Plane(origin=(-9.144, 0, 0), x_dir=(0, -1, 0), z_dir=(-1, 0, 0))):
        with BuildLine():
            Line((19.05, 20.955), (19.05, 17.145))
            ThreePointArc((19.05, 17.145), (20.3970384182, 17.7029615818), (20.955, 19.05))
            ThreePointArc((20.955, 19.05), (20.3970384182, 20.3970384182), (19.05, 20.955))
        make_face()
        with BuildLine():
            ThreePointArc((19.05, 20.955), (17.145, 19.05), (19.05, 17.145))
            Line((19.05, 17.145), (19.05, 20.955))
        make_face()
    extrude(amount=F33_DEPTH)

    # F34 (on face) → F35 (join)
    with BuildSketch(Plane(origin=(-10.414, 0, 0), x_dir=(0, -1, 0), z_dir=(-1, 0, 0))):
        with BuildLine():
            Line((19.05, 19.685), (19.05, 18.415))
            ThreePointArc((19.05, 18.415), (19.4990128061, 18.6009871939), (19.685, 19.05))
            ThreePointArc((19.685, 19.05), (19.4990128061, 19.4990128061), (19.05, 19.685))
        make_face()
        with BuildLine():
            ThreePointArc((19.05, 19.685), (18.415, 19.05), (19.05, 18.415))
            Line((19.05, 18.415), (19.05, 19.685))
        make_face()
    extrude(amount=F35_DEPTH)


solid = f1.part
